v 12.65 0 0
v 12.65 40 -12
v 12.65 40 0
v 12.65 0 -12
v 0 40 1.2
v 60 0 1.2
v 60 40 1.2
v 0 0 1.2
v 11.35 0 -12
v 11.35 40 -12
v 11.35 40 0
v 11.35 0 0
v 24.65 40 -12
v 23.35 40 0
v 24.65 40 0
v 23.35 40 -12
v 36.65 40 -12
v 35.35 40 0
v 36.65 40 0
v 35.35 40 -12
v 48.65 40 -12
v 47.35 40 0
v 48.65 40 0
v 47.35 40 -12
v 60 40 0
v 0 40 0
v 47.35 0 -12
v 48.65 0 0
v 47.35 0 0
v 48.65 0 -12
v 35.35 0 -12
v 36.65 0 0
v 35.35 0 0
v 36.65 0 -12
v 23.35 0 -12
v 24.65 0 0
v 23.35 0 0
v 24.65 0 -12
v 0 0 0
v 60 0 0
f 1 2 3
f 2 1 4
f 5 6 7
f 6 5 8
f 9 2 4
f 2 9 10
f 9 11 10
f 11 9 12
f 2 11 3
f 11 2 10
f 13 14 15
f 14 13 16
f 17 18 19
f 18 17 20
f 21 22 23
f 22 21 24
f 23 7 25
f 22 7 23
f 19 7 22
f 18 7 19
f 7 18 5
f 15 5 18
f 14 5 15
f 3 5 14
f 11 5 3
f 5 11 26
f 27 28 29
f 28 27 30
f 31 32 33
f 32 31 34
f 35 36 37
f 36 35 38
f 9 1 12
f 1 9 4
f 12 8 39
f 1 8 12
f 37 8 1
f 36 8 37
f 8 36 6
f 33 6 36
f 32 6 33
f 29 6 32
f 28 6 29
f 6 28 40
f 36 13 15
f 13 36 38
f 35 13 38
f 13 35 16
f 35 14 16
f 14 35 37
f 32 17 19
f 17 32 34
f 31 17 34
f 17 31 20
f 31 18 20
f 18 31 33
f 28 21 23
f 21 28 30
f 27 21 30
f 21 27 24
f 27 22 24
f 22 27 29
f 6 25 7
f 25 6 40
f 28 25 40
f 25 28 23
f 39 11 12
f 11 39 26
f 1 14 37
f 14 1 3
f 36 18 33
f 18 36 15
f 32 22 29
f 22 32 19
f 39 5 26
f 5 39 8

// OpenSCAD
$fn = 32;

// ----------------------------------------------------------------------
// Ribbed panel: 1.2 mm panel
// ----------------------------------------------------------------------

// --- parameters (mm) ---
panel_l = 60;             // panel length, X
panel_w = 40;             // panel width, Y
panel_t = 1.2;            // panel thickness, Z
rib_t = 1.3;              // rib thickness
rib_h = 12;               // rib height below the panel
ribs = 4;                 // number of ribs
fit_tol = 0.05;           // tolerance for press fits, mm
free_tol = 0.2;           // tolerance for clearance fits, mm

total_h = panel_t + rib_h;  // overall height

union() {
  cube([panel_l, panel_w, panel_t]);
  for (i = [1 : ribs])
    translate([i * panel_l / (ribs + 1) - rib_t / 2, 0, -rib_h])
      cube([rib_t, panel_w, rib_h + panel_t]);
}
